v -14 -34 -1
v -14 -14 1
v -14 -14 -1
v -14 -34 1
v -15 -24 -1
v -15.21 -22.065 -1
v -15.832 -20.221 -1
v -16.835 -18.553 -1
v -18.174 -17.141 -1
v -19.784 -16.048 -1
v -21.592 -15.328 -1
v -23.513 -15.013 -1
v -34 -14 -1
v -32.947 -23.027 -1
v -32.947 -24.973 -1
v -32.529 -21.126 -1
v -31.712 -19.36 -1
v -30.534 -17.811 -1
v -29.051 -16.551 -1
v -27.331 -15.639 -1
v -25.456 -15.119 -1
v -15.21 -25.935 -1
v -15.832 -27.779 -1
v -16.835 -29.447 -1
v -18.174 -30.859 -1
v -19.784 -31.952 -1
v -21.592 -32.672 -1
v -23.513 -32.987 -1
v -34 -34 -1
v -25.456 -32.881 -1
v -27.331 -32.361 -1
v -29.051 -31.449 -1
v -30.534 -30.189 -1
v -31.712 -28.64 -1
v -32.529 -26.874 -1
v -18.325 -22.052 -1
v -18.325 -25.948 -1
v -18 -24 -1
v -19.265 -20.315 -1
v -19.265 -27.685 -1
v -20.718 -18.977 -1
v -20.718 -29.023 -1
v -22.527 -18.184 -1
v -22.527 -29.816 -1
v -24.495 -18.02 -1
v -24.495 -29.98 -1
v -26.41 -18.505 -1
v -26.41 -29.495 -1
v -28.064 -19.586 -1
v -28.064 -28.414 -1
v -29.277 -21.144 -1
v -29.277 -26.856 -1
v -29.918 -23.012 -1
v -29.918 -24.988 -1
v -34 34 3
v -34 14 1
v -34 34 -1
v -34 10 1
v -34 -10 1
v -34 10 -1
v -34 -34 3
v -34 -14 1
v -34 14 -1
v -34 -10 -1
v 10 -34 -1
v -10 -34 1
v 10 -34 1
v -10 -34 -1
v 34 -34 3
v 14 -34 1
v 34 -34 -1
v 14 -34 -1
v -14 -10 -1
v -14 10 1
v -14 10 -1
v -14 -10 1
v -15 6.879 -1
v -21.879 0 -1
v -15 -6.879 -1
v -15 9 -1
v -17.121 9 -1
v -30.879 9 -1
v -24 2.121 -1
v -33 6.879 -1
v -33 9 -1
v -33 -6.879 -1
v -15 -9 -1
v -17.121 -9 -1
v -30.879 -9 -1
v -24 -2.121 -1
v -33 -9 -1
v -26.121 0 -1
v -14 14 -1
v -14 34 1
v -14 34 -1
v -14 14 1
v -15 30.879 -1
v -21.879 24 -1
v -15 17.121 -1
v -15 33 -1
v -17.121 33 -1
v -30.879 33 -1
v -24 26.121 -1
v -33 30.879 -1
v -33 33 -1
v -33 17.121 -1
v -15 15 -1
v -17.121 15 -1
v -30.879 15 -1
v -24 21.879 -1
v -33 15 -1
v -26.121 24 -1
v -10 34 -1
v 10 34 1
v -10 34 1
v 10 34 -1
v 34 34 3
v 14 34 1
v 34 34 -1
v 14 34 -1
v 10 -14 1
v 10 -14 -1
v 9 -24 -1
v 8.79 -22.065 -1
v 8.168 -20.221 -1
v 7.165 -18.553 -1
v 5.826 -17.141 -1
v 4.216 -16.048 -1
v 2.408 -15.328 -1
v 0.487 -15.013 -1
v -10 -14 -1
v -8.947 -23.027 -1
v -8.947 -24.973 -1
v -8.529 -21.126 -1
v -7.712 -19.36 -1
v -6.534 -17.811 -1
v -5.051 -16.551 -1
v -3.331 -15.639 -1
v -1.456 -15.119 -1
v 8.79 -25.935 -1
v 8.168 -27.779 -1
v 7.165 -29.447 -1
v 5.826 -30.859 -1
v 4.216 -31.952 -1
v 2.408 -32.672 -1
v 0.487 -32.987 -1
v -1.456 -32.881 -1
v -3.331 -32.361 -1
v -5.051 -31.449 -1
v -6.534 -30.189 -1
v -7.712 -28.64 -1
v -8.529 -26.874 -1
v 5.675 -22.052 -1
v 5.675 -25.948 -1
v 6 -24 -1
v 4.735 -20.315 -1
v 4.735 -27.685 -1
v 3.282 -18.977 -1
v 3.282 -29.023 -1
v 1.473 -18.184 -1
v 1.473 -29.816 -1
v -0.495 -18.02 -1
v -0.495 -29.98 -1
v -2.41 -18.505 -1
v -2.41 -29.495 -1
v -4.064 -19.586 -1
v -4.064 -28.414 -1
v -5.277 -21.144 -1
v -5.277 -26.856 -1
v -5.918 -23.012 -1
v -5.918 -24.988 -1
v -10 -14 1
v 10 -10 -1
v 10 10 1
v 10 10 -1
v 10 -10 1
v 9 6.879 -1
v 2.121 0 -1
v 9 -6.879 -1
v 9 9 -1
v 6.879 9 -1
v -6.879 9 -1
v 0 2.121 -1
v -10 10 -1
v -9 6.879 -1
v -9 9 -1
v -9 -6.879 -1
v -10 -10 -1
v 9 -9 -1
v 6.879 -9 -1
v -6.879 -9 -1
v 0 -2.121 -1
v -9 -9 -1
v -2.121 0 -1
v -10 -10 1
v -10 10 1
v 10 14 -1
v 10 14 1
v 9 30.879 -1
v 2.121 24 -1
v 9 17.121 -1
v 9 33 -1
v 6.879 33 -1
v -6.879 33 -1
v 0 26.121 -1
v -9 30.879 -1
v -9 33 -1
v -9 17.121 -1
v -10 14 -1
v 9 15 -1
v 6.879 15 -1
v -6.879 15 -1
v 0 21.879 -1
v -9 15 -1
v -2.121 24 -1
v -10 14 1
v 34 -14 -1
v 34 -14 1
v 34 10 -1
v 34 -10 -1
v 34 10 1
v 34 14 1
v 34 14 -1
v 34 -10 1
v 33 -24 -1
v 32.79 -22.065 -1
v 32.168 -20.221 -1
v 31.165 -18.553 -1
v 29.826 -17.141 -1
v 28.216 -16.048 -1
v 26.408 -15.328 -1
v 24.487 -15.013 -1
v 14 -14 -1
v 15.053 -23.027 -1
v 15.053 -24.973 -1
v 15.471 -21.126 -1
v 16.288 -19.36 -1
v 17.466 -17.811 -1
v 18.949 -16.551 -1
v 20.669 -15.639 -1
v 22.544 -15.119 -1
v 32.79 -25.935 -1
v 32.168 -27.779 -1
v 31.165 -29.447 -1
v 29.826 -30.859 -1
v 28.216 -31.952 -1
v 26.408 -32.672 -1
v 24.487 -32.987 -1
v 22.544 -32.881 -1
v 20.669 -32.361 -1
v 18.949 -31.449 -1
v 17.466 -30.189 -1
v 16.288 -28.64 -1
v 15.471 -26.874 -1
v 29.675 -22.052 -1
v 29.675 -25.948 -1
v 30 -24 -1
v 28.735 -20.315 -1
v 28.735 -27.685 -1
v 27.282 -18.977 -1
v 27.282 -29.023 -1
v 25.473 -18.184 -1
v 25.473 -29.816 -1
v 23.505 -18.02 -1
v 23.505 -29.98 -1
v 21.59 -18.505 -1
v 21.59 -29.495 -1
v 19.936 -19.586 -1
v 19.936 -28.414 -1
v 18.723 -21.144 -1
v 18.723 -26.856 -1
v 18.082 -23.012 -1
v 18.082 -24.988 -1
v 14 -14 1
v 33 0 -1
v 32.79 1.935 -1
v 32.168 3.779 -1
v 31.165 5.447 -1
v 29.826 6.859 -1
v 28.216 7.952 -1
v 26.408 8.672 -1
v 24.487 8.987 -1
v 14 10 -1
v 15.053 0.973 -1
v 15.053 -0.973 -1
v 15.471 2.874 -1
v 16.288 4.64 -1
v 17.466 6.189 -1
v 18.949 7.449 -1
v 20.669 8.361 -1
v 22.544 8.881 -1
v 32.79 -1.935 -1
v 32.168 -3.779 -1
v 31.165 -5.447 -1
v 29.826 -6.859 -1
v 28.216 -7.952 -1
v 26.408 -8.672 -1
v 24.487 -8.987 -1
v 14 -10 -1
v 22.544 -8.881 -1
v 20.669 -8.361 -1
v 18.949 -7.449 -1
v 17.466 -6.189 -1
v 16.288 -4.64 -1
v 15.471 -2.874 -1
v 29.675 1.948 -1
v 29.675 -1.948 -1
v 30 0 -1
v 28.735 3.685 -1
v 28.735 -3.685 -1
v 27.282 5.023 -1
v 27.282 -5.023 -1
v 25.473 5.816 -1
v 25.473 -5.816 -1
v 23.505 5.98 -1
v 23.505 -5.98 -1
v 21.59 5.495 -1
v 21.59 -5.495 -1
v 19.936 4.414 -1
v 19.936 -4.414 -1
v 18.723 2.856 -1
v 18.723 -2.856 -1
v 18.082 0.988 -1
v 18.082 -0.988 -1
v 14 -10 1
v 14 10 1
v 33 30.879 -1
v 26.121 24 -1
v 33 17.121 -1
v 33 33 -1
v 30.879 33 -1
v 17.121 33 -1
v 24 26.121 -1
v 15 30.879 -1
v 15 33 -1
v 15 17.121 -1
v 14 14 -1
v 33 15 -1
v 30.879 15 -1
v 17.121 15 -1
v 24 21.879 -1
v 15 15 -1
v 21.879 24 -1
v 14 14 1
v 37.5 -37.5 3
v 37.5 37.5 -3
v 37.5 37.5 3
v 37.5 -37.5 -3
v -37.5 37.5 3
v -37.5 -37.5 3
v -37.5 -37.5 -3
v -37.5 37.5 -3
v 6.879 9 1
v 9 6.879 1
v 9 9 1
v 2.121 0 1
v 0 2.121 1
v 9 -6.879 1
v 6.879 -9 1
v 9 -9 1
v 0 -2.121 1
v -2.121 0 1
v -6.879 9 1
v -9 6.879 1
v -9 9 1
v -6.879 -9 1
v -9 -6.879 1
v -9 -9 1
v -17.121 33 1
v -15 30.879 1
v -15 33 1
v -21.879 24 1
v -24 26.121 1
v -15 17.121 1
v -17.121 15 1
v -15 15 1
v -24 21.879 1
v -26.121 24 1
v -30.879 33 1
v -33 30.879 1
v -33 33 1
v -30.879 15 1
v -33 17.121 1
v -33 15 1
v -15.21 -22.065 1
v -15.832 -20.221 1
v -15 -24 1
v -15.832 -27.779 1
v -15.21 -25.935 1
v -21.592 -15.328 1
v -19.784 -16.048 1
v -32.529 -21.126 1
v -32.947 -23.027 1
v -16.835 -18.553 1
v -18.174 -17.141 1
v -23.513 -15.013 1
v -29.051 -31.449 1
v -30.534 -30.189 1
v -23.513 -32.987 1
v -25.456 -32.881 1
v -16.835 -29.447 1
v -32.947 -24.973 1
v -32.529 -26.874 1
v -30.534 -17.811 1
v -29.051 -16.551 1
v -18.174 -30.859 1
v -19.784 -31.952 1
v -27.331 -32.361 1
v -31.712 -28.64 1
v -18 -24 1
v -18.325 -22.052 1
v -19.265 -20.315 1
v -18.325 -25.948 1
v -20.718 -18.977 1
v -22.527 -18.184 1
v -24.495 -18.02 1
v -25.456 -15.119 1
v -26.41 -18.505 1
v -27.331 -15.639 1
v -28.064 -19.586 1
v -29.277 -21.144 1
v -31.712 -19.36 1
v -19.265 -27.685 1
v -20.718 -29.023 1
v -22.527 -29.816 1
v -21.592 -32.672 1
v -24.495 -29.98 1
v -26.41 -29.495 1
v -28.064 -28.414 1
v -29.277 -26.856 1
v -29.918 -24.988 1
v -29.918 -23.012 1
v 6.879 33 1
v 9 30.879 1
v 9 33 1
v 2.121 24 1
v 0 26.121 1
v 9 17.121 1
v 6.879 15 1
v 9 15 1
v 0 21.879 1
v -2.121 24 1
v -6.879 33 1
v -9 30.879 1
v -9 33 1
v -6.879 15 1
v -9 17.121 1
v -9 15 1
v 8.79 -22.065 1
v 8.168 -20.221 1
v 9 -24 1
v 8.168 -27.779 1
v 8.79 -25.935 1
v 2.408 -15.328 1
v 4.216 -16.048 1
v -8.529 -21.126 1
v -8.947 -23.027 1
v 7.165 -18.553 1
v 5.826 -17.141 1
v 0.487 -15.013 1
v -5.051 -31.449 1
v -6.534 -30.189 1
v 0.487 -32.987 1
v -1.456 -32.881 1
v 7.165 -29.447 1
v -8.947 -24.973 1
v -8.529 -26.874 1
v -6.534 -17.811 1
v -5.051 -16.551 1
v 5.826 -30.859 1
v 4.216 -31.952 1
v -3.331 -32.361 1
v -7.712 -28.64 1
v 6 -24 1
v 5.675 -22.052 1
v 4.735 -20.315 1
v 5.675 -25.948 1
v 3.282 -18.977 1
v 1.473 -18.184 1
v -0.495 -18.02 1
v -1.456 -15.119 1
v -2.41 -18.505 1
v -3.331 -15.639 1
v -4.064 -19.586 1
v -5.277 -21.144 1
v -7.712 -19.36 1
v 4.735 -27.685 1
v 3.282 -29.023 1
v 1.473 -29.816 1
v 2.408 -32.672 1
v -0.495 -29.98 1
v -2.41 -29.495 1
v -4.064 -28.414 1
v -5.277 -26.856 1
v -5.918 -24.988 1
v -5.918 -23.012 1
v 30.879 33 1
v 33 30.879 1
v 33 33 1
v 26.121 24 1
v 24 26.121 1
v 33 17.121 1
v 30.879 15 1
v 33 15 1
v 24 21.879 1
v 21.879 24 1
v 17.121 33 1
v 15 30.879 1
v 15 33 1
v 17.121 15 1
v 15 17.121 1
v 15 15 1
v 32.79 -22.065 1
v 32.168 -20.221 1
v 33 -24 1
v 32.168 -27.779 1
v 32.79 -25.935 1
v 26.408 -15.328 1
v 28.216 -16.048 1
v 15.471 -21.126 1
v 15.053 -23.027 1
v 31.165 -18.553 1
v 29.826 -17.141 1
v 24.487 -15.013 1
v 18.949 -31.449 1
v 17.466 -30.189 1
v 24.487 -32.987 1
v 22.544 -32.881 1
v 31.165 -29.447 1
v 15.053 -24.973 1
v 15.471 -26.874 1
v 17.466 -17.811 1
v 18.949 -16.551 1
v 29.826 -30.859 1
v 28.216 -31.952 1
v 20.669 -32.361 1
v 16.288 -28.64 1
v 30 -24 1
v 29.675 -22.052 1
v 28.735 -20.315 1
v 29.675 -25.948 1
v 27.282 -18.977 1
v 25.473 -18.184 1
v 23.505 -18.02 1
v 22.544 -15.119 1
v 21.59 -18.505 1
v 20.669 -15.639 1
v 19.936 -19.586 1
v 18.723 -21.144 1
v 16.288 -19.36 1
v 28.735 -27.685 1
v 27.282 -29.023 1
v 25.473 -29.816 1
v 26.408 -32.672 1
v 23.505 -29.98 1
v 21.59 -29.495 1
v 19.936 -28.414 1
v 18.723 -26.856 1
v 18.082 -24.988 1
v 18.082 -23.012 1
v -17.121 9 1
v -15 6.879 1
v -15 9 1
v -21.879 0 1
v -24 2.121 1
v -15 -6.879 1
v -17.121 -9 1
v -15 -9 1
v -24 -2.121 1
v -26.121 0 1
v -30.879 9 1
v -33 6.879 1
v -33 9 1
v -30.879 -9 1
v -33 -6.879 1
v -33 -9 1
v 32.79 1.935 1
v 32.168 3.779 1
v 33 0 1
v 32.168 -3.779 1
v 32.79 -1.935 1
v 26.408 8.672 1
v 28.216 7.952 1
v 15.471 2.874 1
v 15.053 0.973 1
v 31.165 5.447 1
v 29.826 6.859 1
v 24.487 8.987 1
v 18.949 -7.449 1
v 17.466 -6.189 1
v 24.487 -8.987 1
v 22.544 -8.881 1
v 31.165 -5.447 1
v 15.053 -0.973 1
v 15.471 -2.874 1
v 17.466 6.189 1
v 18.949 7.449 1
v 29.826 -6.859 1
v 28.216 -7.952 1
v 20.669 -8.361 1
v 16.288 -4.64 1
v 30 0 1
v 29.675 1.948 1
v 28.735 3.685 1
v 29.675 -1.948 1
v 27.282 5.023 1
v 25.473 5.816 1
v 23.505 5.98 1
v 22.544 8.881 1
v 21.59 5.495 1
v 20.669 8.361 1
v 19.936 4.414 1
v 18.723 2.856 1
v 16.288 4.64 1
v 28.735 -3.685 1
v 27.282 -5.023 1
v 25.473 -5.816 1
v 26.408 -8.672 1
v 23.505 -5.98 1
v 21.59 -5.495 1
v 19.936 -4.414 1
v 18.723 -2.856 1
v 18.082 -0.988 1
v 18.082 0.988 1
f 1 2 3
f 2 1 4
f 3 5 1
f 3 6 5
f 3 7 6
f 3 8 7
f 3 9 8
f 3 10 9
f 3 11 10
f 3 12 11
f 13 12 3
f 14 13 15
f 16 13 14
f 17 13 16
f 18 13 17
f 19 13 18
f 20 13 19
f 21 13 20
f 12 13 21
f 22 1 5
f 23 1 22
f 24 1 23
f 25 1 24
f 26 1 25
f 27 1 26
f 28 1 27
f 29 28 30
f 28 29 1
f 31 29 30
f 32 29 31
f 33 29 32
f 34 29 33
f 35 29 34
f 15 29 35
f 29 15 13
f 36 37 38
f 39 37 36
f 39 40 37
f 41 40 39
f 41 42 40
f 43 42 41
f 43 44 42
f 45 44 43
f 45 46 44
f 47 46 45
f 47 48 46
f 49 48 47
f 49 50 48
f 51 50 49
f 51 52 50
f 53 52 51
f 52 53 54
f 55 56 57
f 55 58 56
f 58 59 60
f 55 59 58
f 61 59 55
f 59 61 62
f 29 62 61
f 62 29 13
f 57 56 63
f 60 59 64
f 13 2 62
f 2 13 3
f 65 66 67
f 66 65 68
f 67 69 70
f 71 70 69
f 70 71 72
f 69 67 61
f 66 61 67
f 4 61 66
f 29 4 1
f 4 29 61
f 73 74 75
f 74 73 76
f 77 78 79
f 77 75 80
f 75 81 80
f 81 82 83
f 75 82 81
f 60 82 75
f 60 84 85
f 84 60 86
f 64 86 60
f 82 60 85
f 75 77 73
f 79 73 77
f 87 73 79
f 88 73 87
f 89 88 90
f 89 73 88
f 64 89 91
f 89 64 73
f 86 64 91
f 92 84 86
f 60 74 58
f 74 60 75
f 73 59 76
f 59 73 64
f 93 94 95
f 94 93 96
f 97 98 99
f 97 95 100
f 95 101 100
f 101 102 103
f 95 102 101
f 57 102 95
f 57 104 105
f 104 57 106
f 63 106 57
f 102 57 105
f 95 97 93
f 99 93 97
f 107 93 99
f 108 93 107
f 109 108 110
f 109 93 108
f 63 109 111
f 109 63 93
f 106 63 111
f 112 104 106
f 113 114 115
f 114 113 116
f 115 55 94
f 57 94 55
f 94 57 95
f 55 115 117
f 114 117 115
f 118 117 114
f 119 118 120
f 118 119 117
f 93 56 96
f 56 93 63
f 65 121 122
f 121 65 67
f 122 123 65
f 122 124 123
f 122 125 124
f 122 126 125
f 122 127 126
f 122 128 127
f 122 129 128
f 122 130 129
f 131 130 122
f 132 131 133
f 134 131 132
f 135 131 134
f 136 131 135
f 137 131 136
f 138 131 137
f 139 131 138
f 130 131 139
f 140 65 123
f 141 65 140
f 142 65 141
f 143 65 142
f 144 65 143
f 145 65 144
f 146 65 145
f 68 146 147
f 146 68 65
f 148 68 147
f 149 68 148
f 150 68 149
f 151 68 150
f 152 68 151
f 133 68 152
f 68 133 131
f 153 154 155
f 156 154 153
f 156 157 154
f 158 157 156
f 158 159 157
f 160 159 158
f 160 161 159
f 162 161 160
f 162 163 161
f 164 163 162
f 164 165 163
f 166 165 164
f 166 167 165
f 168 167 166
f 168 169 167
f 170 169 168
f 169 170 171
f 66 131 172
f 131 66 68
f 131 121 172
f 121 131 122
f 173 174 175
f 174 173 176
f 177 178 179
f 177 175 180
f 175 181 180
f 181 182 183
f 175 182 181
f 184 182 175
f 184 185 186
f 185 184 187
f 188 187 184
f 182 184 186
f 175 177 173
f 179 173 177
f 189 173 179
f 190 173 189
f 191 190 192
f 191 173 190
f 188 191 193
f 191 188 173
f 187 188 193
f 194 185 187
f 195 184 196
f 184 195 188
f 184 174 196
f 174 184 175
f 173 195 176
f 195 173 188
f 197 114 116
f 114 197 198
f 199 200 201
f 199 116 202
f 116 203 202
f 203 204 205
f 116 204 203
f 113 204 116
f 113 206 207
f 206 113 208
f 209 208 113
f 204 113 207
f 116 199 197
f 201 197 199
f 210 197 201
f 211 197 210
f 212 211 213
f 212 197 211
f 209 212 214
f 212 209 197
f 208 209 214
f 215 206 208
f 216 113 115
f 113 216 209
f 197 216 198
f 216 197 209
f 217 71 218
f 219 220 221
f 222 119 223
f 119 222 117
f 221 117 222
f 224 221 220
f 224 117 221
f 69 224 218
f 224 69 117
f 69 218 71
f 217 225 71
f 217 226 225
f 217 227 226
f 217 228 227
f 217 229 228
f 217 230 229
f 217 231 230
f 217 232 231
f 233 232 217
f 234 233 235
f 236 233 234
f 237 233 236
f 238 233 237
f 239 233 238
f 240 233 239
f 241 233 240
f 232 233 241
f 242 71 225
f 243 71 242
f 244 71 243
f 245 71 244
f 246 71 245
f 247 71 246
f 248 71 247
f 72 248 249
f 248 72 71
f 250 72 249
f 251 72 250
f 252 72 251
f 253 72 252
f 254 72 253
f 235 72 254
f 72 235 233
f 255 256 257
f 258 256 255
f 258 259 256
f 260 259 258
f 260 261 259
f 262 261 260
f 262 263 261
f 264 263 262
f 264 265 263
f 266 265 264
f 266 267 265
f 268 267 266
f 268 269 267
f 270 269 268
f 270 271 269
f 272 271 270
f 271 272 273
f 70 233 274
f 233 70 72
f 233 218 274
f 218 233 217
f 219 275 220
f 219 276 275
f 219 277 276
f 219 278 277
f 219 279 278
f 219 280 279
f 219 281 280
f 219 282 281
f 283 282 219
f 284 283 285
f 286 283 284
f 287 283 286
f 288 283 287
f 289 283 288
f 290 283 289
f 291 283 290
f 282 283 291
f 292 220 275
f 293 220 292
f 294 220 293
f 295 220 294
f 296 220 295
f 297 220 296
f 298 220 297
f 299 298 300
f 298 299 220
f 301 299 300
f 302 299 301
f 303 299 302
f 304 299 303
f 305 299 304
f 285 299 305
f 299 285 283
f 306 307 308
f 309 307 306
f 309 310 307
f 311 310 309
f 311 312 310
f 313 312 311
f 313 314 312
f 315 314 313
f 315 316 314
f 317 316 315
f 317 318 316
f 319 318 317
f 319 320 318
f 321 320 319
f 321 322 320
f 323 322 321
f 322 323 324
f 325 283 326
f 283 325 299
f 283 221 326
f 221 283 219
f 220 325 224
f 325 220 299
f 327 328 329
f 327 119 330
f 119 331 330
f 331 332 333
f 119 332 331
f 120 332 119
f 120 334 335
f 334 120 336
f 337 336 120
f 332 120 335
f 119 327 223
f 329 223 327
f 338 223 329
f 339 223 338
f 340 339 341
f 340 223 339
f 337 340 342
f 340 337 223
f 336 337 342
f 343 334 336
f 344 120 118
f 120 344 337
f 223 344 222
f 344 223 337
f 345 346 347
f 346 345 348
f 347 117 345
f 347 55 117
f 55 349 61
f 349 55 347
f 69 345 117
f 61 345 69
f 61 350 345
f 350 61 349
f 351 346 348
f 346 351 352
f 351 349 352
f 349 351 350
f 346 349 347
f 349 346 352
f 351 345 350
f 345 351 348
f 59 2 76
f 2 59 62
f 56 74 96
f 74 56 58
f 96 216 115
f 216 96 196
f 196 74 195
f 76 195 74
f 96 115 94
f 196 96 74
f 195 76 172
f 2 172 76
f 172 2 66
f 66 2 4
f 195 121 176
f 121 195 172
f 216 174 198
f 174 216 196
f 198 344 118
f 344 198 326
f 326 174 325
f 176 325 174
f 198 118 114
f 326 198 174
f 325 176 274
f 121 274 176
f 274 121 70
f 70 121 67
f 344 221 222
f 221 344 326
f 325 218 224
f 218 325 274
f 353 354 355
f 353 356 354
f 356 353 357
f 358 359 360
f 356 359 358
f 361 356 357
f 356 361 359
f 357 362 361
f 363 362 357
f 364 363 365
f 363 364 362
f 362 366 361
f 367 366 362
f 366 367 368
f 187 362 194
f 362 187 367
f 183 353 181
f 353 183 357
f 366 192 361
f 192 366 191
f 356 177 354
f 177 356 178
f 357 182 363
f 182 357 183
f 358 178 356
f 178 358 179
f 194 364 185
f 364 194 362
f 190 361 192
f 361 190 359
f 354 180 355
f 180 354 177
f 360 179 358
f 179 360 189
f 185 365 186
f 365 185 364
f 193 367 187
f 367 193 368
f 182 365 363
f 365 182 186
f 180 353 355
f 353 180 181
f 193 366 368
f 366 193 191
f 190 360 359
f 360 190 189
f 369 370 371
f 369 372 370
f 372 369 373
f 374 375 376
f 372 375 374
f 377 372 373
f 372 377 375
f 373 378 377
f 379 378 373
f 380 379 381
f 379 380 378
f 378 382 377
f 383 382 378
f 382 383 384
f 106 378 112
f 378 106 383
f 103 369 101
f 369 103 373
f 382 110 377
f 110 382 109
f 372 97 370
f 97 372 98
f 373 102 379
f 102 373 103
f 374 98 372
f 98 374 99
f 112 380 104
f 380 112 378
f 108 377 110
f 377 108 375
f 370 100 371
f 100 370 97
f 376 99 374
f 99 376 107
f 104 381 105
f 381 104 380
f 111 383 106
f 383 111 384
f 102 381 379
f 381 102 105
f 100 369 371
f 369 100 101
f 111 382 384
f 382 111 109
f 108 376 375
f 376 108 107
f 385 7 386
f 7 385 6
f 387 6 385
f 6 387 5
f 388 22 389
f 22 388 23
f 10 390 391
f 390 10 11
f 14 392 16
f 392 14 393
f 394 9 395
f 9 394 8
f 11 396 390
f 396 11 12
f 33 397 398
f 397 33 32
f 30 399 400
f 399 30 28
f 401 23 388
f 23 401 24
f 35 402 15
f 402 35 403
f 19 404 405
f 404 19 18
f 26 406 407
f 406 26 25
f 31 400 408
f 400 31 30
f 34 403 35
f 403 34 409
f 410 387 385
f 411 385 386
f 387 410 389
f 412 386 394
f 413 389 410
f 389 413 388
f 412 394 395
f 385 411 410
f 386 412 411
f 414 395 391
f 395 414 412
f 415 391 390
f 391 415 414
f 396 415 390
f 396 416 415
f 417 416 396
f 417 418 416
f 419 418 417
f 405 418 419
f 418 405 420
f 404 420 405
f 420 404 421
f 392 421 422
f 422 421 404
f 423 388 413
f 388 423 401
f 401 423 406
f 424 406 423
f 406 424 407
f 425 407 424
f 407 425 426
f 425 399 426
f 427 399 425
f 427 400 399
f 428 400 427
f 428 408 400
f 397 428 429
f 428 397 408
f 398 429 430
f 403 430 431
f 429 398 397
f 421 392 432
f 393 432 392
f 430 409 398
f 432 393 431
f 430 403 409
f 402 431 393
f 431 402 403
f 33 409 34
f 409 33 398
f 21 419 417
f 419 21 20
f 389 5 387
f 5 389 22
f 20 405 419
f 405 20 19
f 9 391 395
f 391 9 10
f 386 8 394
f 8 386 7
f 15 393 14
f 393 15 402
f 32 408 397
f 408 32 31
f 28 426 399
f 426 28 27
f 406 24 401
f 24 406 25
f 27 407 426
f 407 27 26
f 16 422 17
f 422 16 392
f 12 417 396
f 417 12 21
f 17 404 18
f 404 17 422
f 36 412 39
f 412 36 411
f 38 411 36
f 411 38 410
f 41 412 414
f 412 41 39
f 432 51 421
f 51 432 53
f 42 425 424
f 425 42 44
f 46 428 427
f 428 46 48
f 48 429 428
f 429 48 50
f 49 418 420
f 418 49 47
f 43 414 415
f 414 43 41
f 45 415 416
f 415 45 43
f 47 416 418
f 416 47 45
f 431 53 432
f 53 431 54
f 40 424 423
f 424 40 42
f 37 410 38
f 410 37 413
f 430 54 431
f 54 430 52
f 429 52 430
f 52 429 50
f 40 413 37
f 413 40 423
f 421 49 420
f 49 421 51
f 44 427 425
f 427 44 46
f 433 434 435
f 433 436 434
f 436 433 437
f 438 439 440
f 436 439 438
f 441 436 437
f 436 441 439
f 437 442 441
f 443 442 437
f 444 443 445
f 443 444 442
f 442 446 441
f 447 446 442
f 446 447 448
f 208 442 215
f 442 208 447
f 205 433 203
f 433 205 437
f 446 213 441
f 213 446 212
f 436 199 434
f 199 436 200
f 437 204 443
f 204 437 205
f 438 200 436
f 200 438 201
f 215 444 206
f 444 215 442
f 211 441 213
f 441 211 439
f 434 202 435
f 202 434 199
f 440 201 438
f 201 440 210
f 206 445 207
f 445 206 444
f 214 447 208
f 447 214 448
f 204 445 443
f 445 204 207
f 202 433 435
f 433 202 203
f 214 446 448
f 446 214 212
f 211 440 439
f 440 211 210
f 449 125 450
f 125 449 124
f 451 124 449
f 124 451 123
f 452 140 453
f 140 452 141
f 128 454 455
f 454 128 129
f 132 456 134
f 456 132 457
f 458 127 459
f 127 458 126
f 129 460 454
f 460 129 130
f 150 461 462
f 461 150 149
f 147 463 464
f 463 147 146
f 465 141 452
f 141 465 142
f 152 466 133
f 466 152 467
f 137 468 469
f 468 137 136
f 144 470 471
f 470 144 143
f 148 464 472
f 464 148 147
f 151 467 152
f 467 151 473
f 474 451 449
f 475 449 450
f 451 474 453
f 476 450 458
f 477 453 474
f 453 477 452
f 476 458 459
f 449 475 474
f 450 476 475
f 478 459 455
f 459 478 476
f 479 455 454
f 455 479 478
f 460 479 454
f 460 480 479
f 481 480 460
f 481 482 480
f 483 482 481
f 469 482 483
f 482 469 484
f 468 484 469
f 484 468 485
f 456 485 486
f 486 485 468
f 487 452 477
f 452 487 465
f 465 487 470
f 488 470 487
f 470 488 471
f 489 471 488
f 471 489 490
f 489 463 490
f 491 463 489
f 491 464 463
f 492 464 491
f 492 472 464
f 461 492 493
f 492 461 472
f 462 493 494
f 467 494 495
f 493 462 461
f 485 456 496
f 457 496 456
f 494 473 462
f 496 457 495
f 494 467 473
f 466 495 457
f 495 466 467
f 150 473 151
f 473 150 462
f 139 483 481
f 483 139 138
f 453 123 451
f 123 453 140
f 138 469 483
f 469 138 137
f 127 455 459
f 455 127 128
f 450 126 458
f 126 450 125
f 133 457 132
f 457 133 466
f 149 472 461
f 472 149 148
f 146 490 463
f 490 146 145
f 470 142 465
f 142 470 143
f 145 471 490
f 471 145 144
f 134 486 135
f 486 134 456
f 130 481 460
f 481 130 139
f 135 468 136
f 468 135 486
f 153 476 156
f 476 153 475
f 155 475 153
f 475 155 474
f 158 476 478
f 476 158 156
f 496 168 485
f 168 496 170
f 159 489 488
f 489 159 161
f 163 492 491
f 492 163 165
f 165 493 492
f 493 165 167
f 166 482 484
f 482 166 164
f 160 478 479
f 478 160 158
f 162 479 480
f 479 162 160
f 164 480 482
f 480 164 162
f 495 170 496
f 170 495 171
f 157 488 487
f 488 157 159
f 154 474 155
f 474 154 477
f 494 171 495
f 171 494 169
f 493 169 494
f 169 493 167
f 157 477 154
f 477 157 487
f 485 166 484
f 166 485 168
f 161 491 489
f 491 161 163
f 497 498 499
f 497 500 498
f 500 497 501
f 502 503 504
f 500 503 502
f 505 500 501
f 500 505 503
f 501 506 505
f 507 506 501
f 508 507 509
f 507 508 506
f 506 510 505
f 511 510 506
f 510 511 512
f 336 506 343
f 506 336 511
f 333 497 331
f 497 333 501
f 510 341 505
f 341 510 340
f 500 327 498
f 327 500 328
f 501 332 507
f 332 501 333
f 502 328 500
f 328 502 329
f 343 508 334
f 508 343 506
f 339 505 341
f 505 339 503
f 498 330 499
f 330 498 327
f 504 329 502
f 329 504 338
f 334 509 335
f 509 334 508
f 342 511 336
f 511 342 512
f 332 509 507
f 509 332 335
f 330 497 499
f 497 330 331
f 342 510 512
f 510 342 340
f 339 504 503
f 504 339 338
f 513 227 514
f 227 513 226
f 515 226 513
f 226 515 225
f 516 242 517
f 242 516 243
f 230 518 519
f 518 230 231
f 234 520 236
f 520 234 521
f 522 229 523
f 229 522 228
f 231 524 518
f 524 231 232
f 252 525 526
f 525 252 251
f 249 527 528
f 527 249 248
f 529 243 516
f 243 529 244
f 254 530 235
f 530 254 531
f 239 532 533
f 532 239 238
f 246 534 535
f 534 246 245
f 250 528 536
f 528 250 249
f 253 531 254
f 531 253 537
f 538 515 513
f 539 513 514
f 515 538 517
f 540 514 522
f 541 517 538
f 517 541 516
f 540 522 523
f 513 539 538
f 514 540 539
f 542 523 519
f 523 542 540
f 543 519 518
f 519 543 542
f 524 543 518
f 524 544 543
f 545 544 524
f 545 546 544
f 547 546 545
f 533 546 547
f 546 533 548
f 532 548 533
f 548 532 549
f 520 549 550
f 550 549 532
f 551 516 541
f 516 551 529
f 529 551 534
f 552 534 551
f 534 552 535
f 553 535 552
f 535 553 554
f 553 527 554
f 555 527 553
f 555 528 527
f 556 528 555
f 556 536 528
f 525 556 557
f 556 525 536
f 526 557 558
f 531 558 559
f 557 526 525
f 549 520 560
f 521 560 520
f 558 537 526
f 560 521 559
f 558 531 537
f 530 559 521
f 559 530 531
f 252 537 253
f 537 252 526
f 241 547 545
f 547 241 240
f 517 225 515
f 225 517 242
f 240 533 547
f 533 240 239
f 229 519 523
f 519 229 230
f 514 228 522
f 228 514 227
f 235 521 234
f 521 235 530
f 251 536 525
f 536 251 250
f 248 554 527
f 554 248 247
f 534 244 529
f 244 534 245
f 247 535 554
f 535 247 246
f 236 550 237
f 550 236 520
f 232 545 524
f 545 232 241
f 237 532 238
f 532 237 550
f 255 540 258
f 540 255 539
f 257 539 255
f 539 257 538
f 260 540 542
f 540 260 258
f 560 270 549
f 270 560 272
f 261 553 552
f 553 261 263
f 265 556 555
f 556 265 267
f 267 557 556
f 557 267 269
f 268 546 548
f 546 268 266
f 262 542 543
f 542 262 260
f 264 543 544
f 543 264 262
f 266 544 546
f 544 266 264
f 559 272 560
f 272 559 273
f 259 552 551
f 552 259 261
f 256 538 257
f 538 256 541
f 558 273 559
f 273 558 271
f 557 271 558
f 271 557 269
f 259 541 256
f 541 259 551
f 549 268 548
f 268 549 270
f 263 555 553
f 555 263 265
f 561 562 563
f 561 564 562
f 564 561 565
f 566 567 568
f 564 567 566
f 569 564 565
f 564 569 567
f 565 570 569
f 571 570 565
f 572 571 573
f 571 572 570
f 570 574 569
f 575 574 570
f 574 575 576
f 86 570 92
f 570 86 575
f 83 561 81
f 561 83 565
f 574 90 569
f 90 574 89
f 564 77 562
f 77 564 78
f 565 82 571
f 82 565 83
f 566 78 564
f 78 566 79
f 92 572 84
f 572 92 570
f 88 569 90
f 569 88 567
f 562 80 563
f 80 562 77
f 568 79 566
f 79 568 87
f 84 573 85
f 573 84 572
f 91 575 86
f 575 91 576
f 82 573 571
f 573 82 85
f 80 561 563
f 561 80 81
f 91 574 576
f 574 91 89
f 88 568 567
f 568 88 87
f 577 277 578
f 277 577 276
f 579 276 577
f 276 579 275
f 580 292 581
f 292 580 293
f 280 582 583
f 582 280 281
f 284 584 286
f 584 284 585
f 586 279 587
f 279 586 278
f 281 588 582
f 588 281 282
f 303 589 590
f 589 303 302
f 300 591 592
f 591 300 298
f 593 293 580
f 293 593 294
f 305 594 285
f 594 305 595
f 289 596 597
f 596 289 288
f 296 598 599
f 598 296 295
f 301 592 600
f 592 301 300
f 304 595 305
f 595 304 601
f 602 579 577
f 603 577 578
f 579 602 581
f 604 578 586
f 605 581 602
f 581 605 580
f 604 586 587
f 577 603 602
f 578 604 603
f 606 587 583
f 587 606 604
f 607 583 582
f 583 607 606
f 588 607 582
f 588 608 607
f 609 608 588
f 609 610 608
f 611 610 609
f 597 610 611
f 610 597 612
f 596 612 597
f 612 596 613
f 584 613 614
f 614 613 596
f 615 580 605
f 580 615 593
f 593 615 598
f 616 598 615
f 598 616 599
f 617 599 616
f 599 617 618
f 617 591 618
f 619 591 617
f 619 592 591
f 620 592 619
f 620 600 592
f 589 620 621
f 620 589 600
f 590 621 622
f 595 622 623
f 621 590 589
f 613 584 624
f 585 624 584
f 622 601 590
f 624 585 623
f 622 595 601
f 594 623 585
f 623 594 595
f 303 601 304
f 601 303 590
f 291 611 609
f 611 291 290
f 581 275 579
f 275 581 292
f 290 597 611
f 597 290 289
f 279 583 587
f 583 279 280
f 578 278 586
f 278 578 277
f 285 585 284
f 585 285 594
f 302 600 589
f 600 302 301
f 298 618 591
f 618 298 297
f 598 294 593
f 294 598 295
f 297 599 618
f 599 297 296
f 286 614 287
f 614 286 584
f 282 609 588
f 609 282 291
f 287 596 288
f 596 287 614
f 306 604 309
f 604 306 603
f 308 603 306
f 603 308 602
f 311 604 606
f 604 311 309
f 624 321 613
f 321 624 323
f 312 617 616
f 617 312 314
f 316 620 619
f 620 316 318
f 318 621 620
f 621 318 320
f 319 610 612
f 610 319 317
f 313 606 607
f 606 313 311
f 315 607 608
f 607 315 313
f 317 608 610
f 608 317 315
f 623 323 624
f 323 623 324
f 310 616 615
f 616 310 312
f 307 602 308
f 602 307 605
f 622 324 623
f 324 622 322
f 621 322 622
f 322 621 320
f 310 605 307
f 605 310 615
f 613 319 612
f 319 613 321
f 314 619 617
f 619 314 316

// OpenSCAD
//////////////////////////////////////////////////////////////////////////////////////////////////////////////
// tic-tac-toe board by Hugomatic and Basbrun
// 
// http://basbrun.com
// http://hugomatic.ca
//
// contact: hugo@hugomatic.ca
//
// License: 
// Copying is not stealing, but cheating at tic-tac-toe is meh.
// http://en.wikipedia.org/wiki/Tic-tac-toe

// hide / show the board
//draw_board = false;
draw_board = true;

// hide / show the x and os
//draw_x_and_os = false;
draw_x_and_os = true;

// === BOARD  parameters ===
DimX=75;  // external board dimensions in mm
DimY=75;
DimZ=6;

// recess for the pockets
BigH=2;      // from top to thin walls
SmallH=2;  // from thin walls to bottom
BigW=68;   // internal size of play area
BorderW=4;  // thin wall thickness

// === X and O parameters ===
Width= 18;	
Thick=3;
Height=2;
Spacing=24;

// this module draws the board
module tictactoeBase(DimX, DimY,DimZ, BigH, SmallH,BigW, BorderW )
{
	PocketWidth = (BigW-(2*BorderW) ) / 3;
	difference() {
		cube([DimX,DimY,DimZ], center = true);
		translate([0,0,(DimZ/2)-(BigH/2)])	
		{	
			cube([BigW,BigW,BigH], center = true);	
		}
		union() {			
			for(i=[-1,0,1])		
			{
				for(j=[-1,0,1])		
				{
					translate([(i*(BigW-(2*BorderW))/3)+i*BorderW,(j*(BigW-(2*BorderW))/3)+j*BorderW,(DimZ/2)-((SmallH+BigH)/2)])	
					{	
						 
						cube([PocketWidth, PocketWidth, SmallH+BigH], center = true);	
					}
				}
			}
		}
	}
}

// this module generates a single O
module o_piece(Width, Thick, Height)
{
	difference()
	{
		cylinder(r=Width / 2, h=Height, center=true);
		cylinder(r=Width / 2 - Thick , h=Height, center=true);	
	}
}

// this module generates a single X
module x_piece(Width, Thick, Height)
{

	x=2 * Width;
	y = Thick;
	z = Height;
	w = Width;

	difference()
	{	
		union()
		{	
			rotate([0,0,45])
			cube( [x,y,z], center=true);

			rotate([0,0,-45])
			cube( [x,y,z], center=true);
		}

		difference()
		{
			cube([x,x,z], center=true);
			cube([w, w, z], center=true);
		}

	}

}

// this modules draws multiple X and Os
module x_and_os(Width, Thick, Height, Spacing)
{
	for (i=[-Spacing, 0, Spacing])
	{
		// top line, all X
		translate([i,Spacing,0])
			x_piece(Width, Thick, Height);
		
		// bottom line, all Os
		translate([i,-Spacing,0])
			o_piece(Width, Thick, Height);
	}

	x_piece(Width, Thick, Height);

	translate([-Spacing,0,0])
		x_piece(Width, Thick, Height);

	translate([Spacing,0,0])
		o_piece(Width, Thick, Height);
	
}

if (draw_board)
{
	tictactoeBase(DimX, DimY, DimZ, BigH, SmallH, BigW, BorderW);
}

if(draw_x_and_os)
{
	x_and_os(Width, Thick, Height, Spacing);
}
